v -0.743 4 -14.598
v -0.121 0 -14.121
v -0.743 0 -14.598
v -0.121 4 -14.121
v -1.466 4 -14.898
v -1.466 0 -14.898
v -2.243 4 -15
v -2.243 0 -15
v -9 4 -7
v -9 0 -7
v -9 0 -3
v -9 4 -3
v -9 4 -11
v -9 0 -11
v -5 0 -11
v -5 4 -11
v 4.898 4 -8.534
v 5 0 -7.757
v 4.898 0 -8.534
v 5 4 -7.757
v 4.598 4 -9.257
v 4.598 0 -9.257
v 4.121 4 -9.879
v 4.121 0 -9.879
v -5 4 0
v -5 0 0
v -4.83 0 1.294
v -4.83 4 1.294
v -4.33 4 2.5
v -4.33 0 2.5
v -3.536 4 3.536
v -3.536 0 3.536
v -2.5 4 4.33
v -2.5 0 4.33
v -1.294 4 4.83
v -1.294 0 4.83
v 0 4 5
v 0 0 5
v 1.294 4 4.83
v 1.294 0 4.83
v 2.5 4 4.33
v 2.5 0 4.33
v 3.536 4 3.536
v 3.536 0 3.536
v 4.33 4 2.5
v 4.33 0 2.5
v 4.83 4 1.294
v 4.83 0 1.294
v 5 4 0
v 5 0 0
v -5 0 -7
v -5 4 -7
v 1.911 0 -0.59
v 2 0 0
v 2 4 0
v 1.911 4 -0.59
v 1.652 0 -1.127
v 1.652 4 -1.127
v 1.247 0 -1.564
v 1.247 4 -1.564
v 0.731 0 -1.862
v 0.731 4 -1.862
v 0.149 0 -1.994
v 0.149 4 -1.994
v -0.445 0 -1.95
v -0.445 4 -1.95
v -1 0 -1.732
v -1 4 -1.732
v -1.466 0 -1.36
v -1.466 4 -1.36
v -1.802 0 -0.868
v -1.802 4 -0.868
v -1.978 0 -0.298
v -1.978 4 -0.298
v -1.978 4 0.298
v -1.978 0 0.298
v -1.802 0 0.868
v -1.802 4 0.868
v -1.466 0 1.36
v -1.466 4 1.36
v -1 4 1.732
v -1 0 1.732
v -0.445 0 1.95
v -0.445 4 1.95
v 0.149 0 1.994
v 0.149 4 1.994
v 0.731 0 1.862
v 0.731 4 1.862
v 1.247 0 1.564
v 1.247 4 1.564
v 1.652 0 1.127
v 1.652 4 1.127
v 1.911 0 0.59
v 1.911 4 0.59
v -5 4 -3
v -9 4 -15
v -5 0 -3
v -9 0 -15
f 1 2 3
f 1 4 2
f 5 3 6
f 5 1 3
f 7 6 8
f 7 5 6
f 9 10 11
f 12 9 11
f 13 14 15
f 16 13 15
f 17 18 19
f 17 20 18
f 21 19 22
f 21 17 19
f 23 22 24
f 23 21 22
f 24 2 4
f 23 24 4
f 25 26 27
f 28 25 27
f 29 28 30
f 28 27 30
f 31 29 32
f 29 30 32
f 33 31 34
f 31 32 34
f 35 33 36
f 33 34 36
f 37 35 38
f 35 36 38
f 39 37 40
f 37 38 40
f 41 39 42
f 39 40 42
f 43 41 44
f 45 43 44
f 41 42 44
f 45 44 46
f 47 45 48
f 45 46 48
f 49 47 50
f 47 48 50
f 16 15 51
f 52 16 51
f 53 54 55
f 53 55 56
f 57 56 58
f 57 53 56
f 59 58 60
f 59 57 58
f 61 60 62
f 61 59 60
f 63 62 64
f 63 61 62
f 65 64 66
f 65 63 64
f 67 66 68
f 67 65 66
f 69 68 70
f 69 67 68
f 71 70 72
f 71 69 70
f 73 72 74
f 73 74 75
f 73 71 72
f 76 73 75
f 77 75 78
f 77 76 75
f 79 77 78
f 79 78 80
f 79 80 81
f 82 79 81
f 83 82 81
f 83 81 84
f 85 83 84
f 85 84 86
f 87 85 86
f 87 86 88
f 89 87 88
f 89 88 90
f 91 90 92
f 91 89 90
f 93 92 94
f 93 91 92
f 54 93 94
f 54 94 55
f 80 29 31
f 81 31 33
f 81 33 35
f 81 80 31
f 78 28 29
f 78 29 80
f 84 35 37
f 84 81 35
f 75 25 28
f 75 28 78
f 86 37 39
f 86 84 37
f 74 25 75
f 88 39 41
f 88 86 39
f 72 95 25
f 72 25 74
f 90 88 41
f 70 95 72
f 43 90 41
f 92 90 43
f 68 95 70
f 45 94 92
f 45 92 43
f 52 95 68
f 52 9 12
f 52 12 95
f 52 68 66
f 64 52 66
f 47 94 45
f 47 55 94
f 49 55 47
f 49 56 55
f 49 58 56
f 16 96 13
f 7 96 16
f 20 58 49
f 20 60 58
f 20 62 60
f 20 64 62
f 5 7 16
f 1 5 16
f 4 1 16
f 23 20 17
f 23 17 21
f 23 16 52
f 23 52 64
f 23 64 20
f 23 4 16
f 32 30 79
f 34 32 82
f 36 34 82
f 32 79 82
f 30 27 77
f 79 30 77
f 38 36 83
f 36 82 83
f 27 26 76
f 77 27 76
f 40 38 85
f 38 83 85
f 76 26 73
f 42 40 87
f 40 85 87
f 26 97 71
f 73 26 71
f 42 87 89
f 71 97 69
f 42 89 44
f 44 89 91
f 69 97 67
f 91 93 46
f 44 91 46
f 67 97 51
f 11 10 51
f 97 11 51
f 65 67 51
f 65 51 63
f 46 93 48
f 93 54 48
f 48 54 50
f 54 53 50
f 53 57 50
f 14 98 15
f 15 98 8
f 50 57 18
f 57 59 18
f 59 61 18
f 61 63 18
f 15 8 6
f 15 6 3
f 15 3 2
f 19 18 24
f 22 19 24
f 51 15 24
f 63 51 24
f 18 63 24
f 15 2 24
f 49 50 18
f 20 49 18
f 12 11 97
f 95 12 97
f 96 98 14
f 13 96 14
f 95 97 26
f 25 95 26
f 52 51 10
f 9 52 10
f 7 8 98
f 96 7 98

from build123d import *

# Parameters (mm, degrees)
SKETCH1_R           = 2
BOSS_EXTRUDE1_DEPTH = 4
CHAMFER1_SIZE       = 6
FILLET1_R           = 3


with BuildPart() as part:
    # Sketch1 → Boss-Extrude1 (new body)
    with BuildSketch(Plane(origin=(0, 0, 0), x_dir=(1, 0, 0), z_dir=(0, 1, 0))):
        with BuildLine():
            ThreePointArc((-5, 0), (0, -5), (5, 0))
            Line((5, 0), (5, 15))
            Line((5, 15), (-9, 15))
            Line((-9, 15), (-9, 11))
            Line((-9, 11), (-5, 11))
            Line((-5, 11), (-5, 7))
            Line((-5, 7), (-9, 7))
            Line((-9, 7), (-9, 3))
            Line((-9, 3), (-5, 3))
            Line((-5, 3), (-5, 0))
        make_face()
        Circle(SKETCH1_R, mode=Mode.SUBTRACT)
    extrude(amount=BOSS_EXTRUDE1_DEPTH)

    # Chamfer1
    chamfer1_edges = [part.edges().sort_by_distance(p)[0] for p in [
        (5, 2, -15),
    ]]
    chamfer(chamfer1_edges, length=CHAMFER1_SIZE)

    # Fillet1
    fillet1_edges = [part.edges().sort_by_distance(p)[0] for p in [
        (-1, 2, -15),
        (5, 2, -9),
    ]]
    fillet(fillet1_edges, radius=FILLET1_R)


solid = part.part
